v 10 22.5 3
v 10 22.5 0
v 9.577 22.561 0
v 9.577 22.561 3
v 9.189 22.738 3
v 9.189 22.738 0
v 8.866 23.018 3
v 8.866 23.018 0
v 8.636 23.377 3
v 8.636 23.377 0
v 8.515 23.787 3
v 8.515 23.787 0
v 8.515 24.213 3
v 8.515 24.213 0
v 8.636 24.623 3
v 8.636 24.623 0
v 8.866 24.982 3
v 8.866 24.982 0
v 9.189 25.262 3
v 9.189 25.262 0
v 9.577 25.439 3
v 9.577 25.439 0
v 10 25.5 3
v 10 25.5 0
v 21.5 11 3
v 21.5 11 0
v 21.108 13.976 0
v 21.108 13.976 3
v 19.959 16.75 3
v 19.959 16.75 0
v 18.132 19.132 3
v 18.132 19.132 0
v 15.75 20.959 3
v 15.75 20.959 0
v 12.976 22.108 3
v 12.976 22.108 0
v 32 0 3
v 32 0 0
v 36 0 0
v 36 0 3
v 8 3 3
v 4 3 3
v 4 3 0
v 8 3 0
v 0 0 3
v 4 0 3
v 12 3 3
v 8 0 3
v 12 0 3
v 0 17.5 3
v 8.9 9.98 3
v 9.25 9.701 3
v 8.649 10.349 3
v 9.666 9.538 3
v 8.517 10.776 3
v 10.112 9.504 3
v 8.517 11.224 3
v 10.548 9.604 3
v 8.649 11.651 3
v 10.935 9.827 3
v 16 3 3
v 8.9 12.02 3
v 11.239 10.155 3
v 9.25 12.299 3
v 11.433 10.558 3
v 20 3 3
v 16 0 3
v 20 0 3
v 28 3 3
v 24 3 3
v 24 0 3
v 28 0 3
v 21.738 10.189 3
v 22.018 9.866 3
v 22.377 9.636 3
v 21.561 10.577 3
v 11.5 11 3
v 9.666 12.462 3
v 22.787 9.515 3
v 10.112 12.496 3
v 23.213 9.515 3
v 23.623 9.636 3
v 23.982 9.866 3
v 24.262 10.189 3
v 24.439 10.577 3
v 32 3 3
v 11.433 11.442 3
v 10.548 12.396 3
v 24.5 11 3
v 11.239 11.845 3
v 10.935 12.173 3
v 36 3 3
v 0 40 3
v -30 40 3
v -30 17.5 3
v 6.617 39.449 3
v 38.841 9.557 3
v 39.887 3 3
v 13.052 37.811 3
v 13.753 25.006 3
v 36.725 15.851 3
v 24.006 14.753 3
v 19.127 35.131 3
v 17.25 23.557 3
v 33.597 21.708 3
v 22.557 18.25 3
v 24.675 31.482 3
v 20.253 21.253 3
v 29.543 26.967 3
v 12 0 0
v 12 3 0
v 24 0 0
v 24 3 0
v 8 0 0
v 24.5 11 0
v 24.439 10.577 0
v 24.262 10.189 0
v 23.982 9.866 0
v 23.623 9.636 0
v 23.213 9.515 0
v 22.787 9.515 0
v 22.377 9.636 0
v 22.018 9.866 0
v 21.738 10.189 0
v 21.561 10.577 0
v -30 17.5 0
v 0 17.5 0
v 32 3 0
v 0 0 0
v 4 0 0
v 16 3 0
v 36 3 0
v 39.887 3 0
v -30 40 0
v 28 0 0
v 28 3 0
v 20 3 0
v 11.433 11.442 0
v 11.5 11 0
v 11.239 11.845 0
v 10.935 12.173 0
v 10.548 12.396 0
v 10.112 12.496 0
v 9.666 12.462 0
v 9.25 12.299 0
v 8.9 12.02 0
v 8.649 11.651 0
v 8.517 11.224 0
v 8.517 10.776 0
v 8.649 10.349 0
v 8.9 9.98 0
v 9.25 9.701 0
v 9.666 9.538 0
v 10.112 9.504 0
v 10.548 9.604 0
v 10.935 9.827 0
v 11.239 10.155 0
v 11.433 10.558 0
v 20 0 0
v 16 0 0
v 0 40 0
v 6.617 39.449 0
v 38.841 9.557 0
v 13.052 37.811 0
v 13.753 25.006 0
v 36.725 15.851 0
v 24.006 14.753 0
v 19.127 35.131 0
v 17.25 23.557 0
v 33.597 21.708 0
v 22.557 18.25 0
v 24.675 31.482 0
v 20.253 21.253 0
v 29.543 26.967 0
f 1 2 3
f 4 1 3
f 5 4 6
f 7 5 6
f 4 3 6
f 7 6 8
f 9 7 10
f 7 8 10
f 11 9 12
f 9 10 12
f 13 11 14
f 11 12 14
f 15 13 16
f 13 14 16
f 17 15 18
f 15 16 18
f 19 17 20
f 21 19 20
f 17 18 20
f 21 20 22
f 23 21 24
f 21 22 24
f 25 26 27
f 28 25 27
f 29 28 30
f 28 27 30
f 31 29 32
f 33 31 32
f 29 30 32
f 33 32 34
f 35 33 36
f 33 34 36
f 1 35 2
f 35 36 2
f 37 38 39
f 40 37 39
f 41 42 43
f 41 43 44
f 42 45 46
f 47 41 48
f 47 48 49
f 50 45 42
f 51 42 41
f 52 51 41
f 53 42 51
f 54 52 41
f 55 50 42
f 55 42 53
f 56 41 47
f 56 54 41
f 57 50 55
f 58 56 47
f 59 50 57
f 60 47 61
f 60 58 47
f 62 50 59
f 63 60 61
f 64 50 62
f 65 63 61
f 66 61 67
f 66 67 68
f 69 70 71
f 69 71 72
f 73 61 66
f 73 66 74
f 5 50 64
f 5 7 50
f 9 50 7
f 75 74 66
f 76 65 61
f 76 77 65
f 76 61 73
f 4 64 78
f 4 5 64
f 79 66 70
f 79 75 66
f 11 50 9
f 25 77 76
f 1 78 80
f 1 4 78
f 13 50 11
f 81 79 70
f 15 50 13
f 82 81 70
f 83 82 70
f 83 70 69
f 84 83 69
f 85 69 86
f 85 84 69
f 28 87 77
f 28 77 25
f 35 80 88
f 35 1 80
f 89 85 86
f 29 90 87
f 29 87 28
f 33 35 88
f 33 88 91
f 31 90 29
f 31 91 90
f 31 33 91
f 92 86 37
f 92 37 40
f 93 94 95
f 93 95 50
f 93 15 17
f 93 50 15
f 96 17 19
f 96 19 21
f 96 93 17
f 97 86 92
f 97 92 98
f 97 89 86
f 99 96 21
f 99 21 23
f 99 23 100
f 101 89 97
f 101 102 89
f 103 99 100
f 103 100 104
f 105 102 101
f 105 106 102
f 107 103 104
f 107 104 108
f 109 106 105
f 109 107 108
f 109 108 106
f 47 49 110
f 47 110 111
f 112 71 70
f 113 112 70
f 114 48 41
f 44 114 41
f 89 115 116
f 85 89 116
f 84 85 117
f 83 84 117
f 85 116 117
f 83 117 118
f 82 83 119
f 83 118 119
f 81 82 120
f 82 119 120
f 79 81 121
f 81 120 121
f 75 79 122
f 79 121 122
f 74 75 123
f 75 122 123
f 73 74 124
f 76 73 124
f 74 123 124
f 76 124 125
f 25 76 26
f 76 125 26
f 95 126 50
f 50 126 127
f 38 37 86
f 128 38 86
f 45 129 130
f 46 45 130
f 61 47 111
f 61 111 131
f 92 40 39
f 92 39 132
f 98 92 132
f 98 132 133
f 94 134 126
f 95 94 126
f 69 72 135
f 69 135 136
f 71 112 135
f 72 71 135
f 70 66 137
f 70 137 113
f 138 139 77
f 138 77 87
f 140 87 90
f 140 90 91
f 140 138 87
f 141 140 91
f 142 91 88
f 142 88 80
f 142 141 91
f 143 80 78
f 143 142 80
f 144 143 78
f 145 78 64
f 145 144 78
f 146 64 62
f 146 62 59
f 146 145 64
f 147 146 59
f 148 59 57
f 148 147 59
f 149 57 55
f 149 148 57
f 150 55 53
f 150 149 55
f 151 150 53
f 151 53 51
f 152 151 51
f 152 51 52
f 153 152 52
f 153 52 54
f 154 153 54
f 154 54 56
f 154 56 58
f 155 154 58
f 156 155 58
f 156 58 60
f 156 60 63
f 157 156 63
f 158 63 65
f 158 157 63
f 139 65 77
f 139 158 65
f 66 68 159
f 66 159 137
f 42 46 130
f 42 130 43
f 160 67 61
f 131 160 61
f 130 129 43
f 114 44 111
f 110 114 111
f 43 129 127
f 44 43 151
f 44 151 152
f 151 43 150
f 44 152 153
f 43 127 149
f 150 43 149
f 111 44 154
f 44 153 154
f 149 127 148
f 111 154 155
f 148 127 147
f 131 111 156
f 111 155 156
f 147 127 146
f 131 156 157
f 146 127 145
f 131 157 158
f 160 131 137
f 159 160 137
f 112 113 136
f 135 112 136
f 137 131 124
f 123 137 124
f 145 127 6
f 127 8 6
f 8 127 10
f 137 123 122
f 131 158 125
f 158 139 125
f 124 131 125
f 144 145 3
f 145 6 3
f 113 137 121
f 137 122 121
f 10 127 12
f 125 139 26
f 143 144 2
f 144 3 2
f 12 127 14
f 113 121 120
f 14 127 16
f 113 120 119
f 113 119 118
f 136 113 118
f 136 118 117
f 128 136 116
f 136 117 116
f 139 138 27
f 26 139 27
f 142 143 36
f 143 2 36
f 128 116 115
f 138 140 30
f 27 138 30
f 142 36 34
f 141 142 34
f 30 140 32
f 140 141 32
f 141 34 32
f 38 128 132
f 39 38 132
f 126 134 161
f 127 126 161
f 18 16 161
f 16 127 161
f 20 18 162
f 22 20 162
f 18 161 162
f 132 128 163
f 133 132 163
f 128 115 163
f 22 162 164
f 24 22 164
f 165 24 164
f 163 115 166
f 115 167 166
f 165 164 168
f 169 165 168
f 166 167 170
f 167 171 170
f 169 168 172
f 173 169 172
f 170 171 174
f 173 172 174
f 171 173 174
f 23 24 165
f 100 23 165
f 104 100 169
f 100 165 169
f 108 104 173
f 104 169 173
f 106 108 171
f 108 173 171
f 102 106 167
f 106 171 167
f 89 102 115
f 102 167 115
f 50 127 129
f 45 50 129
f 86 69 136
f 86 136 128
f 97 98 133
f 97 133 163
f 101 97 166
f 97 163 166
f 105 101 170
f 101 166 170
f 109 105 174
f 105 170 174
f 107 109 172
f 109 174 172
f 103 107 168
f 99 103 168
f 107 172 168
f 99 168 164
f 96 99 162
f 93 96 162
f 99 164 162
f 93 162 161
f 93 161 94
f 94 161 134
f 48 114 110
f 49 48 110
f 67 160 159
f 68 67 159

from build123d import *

# Parameters (mm, degrees)
ESQUISSE1_R                = 1.5
BOSS_EXTRU_1_DEPTH         = 3
ESQUISSE2_W                = 4
ESQUISSE2_H                = 3
ENL_V_MAT_EXTRU_2_DEPTH    = 3
R_P_TITION_LIN_AIRE1_COUNT = 5
R_P_TITION_LIN_AIRE1_PITCH = 8


with BuildPart() as part:
    # Esquisse1 → Boss.-Extru.1 (new body)
    with BuildSketch(Plane.XY):
        with BuildLine():
            Line((0, 17.5), (0, 0))
            Line((0, 0), (40, 0))
            ThreePointArc((40, 0), (28.284271247, 28.284271247), (0, 40))
            Line((0, 40), (-30, 40))
            Line((-30, 40), (-30, 17.5))
            Line((-30, 17.5), (0, 17.5))
        make_face()
        with Locations((10, 11)):
            Circle(ESQUISSE1_R, mode=Mode.SUBTRACT)
        with BuildLine():
            ThreePointArc((10, 22.5), (8.5, 24), (10, 25.5))
            ThreePointArc((10, 25.5), (20.253048327, 21.253048327), (24.5, 11))
            ThreePointArc((24.5, 11), (23, 9.5), (21.5, 11))
            ThreePointArc((21.5, 11), (18.131727984, 19.131727984), (10, 22.5))
        make_face(mode=Mode.SUBTRACT)
    extrude(amount=BOSS_EXTRU_1_DEPTH)

    # Esquisse2 → Enlèv. mat.-Extru.2 (cut)
    with BuildSketch(Plane.XY.offset(3)):
        with Locations((6, 1.5)):
            Rectangle(ESQUISSE2_W, ESQUISSE2_H)
    enl_v_mat_extru_2 = extrude(amount=-ENL_V_MAT_EXTRU_2_DEPTH, mode=Mode.SUBTRACT)

    # Répétition linéaire1: Enlèv. mat.-Extru.2 ×5
    with Locations(*[(i * R_P_TITION_LIN_AIRE1_PITCH, 0, 0) for i in range(1, R_P_TITION_LIN_AIRE1_COUNT)]):
        add(enl_v_mat_extru_2, mode=Mode.SUBTRACT)


solid = part.part
